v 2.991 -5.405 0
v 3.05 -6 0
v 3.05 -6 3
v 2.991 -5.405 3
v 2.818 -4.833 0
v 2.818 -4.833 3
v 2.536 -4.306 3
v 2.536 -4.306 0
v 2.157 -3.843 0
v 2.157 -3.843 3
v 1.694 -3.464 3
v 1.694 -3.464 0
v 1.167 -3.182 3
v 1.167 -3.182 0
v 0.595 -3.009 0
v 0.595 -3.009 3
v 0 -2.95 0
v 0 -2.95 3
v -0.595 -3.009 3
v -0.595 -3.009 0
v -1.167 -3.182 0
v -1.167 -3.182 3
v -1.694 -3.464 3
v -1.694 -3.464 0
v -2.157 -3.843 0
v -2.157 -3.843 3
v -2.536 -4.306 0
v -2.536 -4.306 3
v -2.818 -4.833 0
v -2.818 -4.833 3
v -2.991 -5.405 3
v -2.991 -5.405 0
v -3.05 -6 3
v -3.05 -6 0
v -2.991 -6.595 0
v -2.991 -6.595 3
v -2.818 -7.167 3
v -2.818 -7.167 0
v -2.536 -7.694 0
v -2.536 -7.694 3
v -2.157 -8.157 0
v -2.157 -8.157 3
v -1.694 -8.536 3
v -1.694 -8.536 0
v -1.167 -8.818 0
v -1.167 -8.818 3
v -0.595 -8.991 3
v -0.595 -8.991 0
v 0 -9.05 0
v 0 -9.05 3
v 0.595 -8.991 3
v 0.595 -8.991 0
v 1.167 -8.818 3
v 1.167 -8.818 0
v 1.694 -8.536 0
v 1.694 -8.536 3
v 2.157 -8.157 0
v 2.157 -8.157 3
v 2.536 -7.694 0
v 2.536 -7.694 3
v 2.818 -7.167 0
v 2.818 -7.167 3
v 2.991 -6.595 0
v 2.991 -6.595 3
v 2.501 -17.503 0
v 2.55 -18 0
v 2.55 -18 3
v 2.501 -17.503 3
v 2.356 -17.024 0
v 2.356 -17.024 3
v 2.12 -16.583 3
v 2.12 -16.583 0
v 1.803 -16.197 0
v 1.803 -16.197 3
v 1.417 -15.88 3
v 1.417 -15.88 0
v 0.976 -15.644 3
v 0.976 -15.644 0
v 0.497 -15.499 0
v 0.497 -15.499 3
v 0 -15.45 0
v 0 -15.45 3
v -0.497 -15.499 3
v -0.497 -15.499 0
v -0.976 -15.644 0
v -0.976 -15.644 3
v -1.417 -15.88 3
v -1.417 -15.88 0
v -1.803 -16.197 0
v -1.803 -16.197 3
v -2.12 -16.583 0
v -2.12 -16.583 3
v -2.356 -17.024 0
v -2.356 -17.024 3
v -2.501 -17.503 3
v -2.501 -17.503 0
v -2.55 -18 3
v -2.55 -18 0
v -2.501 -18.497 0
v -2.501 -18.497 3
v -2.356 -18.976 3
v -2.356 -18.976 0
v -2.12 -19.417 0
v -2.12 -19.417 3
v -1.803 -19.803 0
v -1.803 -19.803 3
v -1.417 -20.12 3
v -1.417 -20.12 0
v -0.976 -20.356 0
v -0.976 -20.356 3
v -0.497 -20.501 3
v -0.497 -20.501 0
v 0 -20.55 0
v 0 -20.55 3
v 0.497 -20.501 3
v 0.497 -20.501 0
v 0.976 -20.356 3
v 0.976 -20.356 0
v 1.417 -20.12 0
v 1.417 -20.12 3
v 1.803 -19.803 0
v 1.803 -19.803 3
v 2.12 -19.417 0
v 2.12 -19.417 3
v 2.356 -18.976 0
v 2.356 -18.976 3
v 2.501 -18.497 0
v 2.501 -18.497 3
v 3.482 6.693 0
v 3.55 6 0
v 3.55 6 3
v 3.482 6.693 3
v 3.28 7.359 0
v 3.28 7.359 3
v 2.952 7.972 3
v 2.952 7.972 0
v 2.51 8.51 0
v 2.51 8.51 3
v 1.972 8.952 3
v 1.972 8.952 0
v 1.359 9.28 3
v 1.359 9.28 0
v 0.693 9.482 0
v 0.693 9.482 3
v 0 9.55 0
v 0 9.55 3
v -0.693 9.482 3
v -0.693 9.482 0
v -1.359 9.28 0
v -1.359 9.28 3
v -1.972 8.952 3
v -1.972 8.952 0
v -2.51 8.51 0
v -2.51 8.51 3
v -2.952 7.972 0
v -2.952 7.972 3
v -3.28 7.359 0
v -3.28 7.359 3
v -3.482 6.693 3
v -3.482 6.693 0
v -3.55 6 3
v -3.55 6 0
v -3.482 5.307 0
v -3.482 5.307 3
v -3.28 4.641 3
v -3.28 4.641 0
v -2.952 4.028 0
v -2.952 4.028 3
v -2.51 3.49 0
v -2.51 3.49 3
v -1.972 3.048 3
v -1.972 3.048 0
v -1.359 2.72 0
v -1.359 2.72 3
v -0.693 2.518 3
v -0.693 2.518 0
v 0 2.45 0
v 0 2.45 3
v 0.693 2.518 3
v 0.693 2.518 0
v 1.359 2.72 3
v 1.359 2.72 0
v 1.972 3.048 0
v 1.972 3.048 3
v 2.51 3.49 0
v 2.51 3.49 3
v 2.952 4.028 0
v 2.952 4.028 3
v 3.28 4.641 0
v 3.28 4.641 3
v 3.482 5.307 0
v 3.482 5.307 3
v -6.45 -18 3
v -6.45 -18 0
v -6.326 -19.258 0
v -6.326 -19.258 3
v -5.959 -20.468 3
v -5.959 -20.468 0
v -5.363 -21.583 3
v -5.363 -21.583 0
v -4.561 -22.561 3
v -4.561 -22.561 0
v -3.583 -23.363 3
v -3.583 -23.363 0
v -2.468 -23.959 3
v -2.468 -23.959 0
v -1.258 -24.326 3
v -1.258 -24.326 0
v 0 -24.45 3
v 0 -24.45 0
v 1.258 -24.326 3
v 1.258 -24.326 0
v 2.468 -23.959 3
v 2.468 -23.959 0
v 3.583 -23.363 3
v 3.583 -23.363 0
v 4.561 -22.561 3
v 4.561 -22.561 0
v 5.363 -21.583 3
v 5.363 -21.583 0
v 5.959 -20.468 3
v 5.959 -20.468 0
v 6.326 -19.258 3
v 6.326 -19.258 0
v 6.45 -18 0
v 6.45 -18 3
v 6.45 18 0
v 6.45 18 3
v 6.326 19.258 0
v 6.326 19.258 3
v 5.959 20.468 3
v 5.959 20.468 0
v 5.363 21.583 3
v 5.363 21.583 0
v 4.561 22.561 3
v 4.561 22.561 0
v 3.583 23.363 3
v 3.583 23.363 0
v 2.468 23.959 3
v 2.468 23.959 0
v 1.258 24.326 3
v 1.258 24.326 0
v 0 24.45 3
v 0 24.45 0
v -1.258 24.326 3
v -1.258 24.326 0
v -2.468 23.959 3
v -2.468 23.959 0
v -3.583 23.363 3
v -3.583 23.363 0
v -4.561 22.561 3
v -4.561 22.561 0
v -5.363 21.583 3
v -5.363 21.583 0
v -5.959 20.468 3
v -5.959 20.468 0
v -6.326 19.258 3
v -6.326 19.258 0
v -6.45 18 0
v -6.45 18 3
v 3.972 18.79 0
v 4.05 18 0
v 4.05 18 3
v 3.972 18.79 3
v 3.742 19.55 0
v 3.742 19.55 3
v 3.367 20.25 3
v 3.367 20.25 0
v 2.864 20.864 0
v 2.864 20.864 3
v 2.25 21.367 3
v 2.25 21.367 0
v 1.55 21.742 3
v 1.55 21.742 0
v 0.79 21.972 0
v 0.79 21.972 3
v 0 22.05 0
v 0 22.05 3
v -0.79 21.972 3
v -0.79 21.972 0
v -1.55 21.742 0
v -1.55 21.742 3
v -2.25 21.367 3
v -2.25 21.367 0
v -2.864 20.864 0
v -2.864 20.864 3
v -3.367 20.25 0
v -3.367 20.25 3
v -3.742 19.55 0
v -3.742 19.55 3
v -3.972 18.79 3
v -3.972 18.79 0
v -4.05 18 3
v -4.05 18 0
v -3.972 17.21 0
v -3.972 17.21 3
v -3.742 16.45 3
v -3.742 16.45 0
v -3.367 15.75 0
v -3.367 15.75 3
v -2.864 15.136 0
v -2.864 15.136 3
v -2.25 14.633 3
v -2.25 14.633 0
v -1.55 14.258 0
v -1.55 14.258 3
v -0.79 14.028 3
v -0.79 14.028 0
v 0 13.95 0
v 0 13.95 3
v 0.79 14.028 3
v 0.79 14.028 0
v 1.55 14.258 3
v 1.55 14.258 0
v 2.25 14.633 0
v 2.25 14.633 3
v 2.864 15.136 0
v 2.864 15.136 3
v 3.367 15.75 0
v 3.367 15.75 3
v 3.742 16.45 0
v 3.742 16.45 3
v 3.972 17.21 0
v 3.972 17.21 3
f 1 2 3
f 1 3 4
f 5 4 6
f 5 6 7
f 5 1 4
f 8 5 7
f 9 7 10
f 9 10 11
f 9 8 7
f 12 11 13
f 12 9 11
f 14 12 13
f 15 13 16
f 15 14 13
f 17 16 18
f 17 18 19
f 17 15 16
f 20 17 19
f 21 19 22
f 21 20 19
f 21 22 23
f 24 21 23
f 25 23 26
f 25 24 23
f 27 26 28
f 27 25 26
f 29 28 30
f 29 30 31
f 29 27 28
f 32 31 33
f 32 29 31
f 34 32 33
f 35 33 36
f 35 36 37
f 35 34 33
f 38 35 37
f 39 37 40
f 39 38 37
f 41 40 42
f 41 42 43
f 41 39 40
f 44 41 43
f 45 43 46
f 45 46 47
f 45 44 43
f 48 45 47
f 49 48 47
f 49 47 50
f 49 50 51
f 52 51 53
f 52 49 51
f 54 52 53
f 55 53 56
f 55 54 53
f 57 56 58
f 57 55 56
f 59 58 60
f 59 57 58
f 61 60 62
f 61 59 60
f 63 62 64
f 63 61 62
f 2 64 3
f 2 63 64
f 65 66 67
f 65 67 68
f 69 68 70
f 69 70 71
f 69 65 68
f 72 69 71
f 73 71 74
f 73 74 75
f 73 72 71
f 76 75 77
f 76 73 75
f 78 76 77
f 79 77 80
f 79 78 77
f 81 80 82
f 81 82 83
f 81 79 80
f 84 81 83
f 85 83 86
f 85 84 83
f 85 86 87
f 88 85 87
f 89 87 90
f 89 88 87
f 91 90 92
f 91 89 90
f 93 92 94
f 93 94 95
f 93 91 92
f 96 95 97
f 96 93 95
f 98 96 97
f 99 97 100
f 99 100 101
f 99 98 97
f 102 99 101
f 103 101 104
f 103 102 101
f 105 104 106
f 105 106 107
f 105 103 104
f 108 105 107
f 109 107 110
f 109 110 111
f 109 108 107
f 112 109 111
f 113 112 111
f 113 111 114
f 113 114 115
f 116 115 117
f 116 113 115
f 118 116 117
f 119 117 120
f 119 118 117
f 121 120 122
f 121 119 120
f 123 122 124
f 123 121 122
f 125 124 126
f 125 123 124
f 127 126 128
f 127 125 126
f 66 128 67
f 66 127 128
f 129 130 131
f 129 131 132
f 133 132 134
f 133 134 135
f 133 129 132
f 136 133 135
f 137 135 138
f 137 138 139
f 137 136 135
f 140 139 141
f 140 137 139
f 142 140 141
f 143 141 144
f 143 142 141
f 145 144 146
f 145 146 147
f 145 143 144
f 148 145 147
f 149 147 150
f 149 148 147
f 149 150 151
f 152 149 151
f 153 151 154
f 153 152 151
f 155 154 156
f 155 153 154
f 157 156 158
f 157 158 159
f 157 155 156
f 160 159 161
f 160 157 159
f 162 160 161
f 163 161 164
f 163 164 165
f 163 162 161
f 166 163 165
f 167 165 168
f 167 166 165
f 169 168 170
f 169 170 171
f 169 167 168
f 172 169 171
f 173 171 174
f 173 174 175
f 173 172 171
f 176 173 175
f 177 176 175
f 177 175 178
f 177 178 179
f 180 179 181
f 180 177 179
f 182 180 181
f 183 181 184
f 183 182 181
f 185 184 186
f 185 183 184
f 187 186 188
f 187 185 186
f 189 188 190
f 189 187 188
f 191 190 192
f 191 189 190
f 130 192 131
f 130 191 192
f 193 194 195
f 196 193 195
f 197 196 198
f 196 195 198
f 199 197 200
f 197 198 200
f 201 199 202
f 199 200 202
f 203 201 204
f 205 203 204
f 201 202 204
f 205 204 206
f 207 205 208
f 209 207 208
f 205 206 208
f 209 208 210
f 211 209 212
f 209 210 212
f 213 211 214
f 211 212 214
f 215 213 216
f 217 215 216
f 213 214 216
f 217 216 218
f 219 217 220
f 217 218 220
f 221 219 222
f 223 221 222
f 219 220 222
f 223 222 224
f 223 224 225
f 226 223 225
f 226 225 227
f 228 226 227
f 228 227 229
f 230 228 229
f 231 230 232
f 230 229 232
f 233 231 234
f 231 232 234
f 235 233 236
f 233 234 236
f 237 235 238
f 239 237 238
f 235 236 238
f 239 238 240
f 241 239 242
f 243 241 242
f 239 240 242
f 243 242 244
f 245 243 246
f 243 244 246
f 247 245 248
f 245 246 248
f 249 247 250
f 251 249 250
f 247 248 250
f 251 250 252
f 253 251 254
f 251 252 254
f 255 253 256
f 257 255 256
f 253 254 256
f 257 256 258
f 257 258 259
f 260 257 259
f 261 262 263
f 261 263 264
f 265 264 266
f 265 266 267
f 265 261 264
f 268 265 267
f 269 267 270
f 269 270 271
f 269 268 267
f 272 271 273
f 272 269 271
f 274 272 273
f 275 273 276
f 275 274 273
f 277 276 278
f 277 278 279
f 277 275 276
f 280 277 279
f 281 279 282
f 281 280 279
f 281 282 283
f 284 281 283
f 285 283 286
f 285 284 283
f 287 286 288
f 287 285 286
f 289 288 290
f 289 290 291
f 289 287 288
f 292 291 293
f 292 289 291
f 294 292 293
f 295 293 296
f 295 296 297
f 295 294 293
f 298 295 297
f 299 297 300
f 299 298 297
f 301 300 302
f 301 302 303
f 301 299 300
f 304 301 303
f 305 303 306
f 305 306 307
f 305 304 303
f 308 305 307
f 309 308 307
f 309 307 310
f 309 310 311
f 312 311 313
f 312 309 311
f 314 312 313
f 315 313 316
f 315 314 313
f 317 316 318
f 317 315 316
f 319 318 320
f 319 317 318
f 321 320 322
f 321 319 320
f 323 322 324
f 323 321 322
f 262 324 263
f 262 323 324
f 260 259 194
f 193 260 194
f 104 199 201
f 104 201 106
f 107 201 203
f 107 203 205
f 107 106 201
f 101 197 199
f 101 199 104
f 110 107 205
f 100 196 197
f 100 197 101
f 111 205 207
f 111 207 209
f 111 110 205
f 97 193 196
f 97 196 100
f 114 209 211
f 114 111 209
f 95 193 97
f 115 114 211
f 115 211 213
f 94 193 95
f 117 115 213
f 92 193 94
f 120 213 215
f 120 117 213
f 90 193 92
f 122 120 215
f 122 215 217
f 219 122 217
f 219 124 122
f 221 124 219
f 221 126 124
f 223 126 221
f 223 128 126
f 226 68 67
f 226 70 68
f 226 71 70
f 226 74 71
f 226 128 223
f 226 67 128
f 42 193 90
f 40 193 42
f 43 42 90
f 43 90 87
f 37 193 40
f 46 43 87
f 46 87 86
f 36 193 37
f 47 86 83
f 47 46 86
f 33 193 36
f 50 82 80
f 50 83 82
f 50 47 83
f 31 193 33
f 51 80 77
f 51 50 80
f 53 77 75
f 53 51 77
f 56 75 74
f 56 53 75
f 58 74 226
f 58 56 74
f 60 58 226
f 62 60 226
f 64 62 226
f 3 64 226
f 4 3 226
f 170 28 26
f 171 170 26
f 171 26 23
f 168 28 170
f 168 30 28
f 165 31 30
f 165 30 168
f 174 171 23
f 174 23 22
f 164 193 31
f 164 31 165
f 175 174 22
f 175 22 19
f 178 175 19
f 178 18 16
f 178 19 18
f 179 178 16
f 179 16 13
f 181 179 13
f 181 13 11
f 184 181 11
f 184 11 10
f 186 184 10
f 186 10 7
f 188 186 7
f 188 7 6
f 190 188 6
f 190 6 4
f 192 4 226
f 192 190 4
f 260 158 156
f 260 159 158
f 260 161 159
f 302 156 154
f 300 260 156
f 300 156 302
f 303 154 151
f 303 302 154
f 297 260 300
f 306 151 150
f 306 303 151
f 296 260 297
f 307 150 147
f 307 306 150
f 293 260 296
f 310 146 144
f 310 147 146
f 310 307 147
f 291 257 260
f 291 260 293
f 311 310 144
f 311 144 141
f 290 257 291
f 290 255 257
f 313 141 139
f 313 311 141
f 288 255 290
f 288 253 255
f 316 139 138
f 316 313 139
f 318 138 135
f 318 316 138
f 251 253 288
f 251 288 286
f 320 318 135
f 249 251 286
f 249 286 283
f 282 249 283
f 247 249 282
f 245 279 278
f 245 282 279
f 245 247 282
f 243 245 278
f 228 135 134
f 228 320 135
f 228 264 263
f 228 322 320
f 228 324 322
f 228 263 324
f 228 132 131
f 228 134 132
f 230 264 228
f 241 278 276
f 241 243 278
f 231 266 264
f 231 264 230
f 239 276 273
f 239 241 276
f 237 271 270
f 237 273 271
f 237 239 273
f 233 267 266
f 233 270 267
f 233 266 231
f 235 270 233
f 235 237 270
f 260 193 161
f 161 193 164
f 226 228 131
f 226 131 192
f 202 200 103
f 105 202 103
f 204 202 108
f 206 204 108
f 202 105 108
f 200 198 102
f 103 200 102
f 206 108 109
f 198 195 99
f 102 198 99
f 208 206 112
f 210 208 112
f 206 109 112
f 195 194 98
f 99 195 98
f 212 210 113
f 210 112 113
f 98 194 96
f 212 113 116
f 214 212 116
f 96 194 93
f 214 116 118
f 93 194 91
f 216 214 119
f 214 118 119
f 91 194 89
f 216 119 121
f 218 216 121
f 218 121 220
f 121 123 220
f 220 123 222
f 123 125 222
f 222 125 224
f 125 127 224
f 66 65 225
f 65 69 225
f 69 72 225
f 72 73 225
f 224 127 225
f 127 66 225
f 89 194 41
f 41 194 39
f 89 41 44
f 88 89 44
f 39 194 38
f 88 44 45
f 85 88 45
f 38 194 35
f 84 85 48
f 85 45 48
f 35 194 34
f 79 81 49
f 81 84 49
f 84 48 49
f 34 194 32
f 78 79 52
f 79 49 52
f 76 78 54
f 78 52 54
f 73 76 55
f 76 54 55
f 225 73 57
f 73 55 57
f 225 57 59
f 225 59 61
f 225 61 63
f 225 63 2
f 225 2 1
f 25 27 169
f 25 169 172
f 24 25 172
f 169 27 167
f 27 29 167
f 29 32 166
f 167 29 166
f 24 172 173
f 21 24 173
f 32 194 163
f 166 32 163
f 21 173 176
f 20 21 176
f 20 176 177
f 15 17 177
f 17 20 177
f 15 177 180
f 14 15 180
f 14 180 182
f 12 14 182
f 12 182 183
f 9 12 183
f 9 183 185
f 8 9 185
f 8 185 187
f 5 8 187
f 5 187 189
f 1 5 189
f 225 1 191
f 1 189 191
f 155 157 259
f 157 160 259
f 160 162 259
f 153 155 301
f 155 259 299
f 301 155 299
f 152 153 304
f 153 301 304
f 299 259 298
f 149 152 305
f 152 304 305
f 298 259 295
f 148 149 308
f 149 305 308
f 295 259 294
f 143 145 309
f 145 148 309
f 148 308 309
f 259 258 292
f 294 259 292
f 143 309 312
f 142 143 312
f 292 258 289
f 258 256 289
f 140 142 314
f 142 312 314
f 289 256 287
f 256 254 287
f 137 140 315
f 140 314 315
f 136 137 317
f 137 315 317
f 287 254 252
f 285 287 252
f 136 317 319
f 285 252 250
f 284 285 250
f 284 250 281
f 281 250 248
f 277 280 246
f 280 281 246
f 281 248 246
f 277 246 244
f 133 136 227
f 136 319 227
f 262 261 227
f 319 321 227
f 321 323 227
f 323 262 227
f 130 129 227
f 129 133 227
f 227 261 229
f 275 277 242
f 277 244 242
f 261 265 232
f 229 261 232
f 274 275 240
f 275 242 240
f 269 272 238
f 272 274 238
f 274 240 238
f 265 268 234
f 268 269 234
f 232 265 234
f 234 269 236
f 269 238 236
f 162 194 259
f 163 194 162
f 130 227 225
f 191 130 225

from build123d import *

# Parameters (mm, degrees)
F0_R     = 2.55
F0_R_2   = 3.05
F0_R_3   = 3.55
F0_R_4   = 4.05
F1_DEPTH = 3


with BuildPart() as f1:
    # F0 (on Top) → F1 (new body)
    with BuildSketch(Plane.XY):
        with BuildLine():
            Line((-6.45, 18), (-6.45, -18))
            ThreePointArc((-6.45, -18), (0, -24.45), (6.45, -18))
            Line((6.45, -18), (6.45, 18))
            ThreePointArc((6.45, 18), (0, 24.45), (-6.45, 18))
        make_face()
        with Locations((0, -18)):
            Circle(F0_R, mode=Mode.SUBTRACT)
        with Locations((0, -6)):
            Circle(F0_R_2, mode=Mode.SUBTRACT)
        with Locations((0, 6)):
            Circle(F0_R_3, mode=Mode.SUBTRACT)
        with Locations((0, 18)):
            Circle(F0_R_4, mode=Mode.SUBTRACT)
    extrude(amount=F1_DEPTH)


solid = f1.part
